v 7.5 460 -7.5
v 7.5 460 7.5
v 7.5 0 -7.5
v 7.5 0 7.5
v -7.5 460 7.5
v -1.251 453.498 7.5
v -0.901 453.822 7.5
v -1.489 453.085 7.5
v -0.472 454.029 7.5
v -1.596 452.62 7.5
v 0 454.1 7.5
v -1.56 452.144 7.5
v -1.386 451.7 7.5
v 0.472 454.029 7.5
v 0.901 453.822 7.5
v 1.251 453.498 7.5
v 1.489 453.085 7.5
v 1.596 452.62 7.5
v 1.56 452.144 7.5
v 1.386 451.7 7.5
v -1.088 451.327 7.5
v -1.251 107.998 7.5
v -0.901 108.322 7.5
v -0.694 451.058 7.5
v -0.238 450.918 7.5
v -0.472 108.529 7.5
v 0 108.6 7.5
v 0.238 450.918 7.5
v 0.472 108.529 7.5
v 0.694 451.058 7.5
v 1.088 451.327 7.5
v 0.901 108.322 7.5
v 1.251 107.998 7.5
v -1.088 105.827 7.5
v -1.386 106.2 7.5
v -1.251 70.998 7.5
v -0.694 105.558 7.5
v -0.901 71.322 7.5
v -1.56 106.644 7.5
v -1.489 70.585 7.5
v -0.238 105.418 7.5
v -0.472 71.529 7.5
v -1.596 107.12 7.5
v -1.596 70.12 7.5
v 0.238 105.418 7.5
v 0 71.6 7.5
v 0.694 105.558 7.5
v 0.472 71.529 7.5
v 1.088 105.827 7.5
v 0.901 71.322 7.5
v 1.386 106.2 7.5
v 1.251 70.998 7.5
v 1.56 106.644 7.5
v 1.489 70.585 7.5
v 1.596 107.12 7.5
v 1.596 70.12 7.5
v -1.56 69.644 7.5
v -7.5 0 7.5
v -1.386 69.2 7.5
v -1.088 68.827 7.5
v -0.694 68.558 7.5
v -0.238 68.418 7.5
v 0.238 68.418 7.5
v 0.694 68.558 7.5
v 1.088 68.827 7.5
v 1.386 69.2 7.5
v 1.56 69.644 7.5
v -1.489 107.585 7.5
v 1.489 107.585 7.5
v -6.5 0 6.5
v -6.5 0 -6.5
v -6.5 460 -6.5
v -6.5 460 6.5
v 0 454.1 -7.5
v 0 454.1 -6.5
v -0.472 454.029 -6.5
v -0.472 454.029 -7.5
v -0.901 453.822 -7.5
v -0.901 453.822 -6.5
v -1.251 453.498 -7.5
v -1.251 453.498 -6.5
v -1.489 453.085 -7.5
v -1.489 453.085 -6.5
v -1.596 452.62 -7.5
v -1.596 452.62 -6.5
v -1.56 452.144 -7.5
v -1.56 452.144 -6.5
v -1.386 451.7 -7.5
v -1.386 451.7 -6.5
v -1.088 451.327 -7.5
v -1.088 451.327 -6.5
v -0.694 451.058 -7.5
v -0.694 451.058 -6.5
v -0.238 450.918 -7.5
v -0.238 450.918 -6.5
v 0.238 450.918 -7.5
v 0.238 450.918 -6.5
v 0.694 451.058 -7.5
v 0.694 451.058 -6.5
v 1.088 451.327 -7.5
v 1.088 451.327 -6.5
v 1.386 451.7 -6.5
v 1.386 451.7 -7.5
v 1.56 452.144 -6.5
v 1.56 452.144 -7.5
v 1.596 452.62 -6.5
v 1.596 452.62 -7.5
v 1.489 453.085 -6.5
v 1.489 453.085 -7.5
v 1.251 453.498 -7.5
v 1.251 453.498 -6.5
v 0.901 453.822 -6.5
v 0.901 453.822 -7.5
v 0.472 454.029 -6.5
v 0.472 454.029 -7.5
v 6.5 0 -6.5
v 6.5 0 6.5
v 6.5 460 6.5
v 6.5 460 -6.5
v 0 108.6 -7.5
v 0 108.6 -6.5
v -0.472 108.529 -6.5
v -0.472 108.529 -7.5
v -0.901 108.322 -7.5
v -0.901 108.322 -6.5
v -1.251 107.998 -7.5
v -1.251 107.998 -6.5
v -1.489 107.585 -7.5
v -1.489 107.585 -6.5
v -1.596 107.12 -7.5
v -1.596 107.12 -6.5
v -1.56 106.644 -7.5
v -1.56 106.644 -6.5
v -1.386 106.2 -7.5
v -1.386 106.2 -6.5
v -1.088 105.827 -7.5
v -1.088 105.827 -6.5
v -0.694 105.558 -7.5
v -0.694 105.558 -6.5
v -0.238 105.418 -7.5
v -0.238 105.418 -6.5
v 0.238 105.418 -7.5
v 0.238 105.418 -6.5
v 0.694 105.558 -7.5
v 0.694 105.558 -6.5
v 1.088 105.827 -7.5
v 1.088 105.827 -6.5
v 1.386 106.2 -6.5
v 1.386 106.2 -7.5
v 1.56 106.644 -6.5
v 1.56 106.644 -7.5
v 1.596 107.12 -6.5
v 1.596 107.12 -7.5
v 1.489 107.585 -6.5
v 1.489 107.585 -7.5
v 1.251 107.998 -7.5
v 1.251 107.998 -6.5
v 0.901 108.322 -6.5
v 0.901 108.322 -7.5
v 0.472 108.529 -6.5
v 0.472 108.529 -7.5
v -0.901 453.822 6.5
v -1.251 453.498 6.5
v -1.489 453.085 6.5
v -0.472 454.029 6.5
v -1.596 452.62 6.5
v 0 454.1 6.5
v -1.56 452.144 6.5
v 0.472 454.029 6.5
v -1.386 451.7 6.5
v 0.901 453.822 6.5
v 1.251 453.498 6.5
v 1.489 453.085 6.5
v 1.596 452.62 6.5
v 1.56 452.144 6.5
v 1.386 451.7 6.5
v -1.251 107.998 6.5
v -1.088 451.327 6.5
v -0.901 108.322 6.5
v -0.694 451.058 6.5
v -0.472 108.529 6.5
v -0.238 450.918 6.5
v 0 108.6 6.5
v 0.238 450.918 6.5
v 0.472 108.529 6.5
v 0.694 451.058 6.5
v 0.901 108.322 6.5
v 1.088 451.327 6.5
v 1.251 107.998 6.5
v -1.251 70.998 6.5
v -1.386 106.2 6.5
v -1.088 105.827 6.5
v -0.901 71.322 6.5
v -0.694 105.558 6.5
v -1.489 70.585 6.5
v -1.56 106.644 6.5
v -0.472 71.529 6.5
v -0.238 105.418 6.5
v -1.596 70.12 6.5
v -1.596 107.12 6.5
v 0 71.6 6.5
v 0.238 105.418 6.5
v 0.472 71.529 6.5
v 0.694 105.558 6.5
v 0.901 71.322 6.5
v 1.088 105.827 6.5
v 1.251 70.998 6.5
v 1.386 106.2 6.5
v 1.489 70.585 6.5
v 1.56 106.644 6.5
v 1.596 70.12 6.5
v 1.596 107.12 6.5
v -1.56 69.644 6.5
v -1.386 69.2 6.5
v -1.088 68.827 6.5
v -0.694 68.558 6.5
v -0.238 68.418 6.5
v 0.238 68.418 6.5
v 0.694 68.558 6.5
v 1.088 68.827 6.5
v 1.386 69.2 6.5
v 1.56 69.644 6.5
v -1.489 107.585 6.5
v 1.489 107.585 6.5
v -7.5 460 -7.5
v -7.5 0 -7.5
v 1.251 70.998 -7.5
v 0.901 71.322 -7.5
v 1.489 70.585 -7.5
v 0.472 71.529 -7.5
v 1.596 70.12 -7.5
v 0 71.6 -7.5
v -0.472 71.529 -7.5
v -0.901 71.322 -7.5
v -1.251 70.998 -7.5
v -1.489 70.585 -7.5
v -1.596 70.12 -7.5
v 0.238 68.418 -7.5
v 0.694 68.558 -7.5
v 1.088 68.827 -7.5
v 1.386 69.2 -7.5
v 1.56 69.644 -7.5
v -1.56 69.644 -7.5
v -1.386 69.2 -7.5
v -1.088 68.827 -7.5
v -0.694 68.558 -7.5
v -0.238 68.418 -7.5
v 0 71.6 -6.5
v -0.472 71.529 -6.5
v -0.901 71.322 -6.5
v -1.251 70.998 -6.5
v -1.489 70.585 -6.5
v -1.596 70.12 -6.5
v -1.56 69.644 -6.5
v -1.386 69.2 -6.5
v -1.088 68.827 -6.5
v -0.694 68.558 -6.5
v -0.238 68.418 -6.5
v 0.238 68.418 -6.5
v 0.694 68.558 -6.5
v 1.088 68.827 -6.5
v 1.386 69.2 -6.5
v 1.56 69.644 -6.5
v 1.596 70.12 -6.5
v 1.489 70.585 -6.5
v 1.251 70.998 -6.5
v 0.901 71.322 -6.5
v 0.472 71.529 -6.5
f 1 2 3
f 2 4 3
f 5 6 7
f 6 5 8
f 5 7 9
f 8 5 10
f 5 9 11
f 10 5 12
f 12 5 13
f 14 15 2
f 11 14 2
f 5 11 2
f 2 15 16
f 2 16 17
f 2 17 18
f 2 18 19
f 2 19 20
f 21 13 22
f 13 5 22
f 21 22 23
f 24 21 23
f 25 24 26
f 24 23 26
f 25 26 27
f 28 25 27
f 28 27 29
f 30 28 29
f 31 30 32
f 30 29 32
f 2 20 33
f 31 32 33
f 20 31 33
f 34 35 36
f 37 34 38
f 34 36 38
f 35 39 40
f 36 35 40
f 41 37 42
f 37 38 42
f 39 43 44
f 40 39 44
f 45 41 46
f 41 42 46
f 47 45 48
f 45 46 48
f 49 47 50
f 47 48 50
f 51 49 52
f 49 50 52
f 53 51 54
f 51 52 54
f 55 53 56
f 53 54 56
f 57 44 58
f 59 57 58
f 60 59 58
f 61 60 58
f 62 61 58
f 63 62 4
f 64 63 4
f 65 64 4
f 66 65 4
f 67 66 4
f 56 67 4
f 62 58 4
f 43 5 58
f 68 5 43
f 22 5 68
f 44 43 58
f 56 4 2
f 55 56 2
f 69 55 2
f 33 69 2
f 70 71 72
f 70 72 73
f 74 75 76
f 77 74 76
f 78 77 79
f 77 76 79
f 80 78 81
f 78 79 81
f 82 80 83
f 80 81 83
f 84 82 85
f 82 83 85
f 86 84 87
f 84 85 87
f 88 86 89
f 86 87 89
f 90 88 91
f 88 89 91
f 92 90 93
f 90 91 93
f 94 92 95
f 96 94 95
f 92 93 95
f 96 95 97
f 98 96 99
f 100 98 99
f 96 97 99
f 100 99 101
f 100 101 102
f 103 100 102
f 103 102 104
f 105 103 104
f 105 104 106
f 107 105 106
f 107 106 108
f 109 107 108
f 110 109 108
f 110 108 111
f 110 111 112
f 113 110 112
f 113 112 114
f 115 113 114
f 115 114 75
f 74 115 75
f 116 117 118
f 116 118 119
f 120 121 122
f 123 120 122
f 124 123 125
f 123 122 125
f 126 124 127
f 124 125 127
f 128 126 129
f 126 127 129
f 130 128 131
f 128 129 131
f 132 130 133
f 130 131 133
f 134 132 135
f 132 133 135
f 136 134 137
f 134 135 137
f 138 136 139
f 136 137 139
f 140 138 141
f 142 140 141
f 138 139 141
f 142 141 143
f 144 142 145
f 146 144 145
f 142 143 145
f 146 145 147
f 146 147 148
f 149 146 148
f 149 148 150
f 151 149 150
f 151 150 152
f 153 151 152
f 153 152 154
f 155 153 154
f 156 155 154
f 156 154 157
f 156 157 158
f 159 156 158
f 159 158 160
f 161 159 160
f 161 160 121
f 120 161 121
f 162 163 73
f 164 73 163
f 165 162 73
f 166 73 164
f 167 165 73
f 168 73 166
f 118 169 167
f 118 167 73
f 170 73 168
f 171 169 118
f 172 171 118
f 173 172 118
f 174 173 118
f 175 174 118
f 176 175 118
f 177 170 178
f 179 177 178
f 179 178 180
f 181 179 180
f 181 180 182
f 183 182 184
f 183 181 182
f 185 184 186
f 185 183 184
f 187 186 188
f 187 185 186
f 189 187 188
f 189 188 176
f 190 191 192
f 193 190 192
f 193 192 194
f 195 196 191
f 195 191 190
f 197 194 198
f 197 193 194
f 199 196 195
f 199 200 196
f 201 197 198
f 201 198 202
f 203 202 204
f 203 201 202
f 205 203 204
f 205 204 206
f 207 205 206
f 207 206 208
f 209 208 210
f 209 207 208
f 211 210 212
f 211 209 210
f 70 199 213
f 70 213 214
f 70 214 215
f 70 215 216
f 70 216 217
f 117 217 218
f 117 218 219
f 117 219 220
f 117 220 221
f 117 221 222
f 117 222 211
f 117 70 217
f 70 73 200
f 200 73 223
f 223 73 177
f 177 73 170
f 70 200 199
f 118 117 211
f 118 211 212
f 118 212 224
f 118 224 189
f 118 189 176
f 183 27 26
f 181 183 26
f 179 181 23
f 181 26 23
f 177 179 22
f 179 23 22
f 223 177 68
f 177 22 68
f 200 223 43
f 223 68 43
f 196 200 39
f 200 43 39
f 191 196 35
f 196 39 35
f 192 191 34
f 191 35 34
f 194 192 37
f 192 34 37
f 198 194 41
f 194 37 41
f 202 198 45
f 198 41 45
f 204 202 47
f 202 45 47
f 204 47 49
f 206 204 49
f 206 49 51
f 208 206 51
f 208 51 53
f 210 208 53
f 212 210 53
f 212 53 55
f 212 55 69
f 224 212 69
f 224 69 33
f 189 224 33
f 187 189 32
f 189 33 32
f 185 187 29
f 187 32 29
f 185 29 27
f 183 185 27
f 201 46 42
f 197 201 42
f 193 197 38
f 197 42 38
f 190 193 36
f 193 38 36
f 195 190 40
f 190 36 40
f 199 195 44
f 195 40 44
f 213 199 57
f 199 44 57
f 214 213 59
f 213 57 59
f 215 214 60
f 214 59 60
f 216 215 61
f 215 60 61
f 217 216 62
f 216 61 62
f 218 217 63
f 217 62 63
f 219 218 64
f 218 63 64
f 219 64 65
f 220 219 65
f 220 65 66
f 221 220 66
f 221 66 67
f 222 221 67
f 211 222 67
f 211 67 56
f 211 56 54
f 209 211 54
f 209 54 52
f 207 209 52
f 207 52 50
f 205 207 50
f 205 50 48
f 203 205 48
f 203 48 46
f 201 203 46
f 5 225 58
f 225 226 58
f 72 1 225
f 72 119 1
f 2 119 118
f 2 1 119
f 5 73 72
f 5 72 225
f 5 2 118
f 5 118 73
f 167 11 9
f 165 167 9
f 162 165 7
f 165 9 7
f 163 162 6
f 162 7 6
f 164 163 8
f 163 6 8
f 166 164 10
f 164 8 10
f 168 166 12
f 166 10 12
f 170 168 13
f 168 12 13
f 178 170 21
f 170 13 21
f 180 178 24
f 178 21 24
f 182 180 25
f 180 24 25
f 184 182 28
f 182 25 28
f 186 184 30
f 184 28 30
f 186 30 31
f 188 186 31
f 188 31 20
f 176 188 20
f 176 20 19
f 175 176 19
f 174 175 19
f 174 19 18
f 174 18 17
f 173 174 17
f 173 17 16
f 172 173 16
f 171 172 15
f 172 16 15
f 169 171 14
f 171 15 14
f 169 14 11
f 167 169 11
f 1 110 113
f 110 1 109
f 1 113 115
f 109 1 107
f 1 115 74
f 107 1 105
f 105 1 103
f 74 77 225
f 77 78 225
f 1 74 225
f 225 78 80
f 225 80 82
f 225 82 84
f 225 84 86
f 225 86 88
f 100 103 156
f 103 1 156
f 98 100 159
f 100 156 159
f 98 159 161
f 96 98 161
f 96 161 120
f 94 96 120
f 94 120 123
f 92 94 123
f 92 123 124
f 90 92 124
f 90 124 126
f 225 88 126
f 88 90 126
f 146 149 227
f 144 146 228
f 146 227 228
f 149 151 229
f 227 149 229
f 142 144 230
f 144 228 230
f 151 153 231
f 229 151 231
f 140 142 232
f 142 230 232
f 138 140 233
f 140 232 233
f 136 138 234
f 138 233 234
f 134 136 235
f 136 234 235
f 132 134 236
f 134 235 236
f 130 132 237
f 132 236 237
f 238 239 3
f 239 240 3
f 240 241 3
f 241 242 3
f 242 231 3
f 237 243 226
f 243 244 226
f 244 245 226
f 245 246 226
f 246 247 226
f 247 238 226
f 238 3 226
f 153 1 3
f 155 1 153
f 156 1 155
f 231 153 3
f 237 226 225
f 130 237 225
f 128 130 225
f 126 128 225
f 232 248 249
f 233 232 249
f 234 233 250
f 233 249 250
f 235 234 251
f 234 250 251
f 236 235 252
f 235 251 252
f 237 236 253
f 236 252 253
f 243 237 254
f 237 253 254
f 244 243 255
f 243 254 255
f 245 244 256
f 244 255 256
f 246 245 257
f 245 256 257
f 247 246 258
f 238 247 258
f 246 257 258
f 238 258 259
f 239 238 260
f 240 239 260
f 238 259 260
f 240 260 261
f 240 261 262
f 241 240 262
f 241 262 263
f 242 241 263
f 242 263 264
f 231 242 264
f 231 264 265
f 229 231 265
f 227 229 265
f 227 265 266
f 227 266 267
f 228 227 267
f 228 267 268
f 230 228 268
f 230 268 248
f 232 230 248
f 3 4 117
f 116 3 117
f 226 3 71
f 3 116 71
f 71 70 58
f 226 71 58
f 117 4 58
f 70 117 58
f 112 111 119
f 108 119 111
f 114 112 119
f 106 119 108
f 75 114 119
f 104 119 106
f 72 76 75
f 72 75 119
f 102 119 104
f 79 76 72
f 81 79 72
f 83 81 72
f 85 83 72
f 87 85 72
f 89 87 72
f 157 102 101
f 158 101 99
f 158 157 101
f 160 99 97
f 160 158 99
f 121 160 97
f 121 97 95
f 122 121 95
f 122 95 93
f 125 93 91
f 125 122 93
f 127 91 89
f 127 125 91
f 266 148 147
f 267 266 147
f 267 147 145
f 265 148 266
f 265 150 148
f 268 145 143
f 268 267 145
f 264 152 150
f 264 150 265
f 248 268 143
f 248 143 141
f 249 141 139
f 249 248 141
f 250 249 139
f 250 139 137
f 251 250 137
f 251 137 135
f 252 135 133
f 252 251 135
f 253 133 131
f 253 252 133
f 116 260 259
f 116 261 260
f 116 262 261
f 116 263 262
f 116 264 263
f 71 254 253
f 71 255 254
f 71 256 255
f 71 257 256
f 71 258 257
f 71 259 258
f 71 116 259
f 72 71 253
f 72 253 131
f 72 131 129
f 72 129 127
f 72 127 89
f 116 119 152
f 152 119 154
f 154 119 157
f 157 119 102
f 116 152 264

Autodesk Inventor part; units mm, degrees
ref_plane "YZ Plane" through (0, 0, 0) normal (1, 0, 0) x (0, 1, 0)
ref_plane "XZ Plane" through (0, 0, 0) normal (0, 1, 0) x (-1, 0, 0)
ref_plane "XY Plane" through (0, 0, 0) normal (0, 0, 1) x (1, 0, 0)
sketch "スケッチ1" plane through (0, 0, 0) normal (0, 1, 0) x (-1, 0, 0)
  line L0 (-7.5, -7.5) -> (7.5, -7.5)
  line L1 (7.5, -7.5) -> (7.5, 7.5)
  line L2 (7.5, 7.5) -> (-7.5, 7.5)
  line L3 (-7.5, 7.5) -> (-7.5, -7.5)
  line L4 (-7.5, -7.5) -> (7.5, 7.5) construction
  line L5 (7.5, -7.5) -> (-7.5, 7.5) construction
  point P0 (0, 0)
  dimension "d0" = 15
extrude "押し出し1" add sketch "スケッチ1" along normal blind 460
shell "シェル1" thickness 1 removed faces 2 at (2.5, 0, 2.5) at (2.5, 460, 2.5)
sketch "スケッチ2" plane through (7.5, 0, -7.5) normal (0, 0, -1) x (-1, 0, 0)
  line L0 (7.5, 0) -> (7.5, 70) construction
  line L1 (0, 460) -> (15, 460) projected
  point P0 (7.5, 107)
  point P1 (7.5, 452.5)
  dimension "d4" = 37
  dimension "d5" = 70
  dimension "d13" = 7.5
hole "穴1" at (0, 70, -7.5) at (0, 107, -7.5) at (0, 452.5, -7.5) direction (0, 0, 1) diameter 3.2 end through all
properties part number "BaseSupportSQpipe"
